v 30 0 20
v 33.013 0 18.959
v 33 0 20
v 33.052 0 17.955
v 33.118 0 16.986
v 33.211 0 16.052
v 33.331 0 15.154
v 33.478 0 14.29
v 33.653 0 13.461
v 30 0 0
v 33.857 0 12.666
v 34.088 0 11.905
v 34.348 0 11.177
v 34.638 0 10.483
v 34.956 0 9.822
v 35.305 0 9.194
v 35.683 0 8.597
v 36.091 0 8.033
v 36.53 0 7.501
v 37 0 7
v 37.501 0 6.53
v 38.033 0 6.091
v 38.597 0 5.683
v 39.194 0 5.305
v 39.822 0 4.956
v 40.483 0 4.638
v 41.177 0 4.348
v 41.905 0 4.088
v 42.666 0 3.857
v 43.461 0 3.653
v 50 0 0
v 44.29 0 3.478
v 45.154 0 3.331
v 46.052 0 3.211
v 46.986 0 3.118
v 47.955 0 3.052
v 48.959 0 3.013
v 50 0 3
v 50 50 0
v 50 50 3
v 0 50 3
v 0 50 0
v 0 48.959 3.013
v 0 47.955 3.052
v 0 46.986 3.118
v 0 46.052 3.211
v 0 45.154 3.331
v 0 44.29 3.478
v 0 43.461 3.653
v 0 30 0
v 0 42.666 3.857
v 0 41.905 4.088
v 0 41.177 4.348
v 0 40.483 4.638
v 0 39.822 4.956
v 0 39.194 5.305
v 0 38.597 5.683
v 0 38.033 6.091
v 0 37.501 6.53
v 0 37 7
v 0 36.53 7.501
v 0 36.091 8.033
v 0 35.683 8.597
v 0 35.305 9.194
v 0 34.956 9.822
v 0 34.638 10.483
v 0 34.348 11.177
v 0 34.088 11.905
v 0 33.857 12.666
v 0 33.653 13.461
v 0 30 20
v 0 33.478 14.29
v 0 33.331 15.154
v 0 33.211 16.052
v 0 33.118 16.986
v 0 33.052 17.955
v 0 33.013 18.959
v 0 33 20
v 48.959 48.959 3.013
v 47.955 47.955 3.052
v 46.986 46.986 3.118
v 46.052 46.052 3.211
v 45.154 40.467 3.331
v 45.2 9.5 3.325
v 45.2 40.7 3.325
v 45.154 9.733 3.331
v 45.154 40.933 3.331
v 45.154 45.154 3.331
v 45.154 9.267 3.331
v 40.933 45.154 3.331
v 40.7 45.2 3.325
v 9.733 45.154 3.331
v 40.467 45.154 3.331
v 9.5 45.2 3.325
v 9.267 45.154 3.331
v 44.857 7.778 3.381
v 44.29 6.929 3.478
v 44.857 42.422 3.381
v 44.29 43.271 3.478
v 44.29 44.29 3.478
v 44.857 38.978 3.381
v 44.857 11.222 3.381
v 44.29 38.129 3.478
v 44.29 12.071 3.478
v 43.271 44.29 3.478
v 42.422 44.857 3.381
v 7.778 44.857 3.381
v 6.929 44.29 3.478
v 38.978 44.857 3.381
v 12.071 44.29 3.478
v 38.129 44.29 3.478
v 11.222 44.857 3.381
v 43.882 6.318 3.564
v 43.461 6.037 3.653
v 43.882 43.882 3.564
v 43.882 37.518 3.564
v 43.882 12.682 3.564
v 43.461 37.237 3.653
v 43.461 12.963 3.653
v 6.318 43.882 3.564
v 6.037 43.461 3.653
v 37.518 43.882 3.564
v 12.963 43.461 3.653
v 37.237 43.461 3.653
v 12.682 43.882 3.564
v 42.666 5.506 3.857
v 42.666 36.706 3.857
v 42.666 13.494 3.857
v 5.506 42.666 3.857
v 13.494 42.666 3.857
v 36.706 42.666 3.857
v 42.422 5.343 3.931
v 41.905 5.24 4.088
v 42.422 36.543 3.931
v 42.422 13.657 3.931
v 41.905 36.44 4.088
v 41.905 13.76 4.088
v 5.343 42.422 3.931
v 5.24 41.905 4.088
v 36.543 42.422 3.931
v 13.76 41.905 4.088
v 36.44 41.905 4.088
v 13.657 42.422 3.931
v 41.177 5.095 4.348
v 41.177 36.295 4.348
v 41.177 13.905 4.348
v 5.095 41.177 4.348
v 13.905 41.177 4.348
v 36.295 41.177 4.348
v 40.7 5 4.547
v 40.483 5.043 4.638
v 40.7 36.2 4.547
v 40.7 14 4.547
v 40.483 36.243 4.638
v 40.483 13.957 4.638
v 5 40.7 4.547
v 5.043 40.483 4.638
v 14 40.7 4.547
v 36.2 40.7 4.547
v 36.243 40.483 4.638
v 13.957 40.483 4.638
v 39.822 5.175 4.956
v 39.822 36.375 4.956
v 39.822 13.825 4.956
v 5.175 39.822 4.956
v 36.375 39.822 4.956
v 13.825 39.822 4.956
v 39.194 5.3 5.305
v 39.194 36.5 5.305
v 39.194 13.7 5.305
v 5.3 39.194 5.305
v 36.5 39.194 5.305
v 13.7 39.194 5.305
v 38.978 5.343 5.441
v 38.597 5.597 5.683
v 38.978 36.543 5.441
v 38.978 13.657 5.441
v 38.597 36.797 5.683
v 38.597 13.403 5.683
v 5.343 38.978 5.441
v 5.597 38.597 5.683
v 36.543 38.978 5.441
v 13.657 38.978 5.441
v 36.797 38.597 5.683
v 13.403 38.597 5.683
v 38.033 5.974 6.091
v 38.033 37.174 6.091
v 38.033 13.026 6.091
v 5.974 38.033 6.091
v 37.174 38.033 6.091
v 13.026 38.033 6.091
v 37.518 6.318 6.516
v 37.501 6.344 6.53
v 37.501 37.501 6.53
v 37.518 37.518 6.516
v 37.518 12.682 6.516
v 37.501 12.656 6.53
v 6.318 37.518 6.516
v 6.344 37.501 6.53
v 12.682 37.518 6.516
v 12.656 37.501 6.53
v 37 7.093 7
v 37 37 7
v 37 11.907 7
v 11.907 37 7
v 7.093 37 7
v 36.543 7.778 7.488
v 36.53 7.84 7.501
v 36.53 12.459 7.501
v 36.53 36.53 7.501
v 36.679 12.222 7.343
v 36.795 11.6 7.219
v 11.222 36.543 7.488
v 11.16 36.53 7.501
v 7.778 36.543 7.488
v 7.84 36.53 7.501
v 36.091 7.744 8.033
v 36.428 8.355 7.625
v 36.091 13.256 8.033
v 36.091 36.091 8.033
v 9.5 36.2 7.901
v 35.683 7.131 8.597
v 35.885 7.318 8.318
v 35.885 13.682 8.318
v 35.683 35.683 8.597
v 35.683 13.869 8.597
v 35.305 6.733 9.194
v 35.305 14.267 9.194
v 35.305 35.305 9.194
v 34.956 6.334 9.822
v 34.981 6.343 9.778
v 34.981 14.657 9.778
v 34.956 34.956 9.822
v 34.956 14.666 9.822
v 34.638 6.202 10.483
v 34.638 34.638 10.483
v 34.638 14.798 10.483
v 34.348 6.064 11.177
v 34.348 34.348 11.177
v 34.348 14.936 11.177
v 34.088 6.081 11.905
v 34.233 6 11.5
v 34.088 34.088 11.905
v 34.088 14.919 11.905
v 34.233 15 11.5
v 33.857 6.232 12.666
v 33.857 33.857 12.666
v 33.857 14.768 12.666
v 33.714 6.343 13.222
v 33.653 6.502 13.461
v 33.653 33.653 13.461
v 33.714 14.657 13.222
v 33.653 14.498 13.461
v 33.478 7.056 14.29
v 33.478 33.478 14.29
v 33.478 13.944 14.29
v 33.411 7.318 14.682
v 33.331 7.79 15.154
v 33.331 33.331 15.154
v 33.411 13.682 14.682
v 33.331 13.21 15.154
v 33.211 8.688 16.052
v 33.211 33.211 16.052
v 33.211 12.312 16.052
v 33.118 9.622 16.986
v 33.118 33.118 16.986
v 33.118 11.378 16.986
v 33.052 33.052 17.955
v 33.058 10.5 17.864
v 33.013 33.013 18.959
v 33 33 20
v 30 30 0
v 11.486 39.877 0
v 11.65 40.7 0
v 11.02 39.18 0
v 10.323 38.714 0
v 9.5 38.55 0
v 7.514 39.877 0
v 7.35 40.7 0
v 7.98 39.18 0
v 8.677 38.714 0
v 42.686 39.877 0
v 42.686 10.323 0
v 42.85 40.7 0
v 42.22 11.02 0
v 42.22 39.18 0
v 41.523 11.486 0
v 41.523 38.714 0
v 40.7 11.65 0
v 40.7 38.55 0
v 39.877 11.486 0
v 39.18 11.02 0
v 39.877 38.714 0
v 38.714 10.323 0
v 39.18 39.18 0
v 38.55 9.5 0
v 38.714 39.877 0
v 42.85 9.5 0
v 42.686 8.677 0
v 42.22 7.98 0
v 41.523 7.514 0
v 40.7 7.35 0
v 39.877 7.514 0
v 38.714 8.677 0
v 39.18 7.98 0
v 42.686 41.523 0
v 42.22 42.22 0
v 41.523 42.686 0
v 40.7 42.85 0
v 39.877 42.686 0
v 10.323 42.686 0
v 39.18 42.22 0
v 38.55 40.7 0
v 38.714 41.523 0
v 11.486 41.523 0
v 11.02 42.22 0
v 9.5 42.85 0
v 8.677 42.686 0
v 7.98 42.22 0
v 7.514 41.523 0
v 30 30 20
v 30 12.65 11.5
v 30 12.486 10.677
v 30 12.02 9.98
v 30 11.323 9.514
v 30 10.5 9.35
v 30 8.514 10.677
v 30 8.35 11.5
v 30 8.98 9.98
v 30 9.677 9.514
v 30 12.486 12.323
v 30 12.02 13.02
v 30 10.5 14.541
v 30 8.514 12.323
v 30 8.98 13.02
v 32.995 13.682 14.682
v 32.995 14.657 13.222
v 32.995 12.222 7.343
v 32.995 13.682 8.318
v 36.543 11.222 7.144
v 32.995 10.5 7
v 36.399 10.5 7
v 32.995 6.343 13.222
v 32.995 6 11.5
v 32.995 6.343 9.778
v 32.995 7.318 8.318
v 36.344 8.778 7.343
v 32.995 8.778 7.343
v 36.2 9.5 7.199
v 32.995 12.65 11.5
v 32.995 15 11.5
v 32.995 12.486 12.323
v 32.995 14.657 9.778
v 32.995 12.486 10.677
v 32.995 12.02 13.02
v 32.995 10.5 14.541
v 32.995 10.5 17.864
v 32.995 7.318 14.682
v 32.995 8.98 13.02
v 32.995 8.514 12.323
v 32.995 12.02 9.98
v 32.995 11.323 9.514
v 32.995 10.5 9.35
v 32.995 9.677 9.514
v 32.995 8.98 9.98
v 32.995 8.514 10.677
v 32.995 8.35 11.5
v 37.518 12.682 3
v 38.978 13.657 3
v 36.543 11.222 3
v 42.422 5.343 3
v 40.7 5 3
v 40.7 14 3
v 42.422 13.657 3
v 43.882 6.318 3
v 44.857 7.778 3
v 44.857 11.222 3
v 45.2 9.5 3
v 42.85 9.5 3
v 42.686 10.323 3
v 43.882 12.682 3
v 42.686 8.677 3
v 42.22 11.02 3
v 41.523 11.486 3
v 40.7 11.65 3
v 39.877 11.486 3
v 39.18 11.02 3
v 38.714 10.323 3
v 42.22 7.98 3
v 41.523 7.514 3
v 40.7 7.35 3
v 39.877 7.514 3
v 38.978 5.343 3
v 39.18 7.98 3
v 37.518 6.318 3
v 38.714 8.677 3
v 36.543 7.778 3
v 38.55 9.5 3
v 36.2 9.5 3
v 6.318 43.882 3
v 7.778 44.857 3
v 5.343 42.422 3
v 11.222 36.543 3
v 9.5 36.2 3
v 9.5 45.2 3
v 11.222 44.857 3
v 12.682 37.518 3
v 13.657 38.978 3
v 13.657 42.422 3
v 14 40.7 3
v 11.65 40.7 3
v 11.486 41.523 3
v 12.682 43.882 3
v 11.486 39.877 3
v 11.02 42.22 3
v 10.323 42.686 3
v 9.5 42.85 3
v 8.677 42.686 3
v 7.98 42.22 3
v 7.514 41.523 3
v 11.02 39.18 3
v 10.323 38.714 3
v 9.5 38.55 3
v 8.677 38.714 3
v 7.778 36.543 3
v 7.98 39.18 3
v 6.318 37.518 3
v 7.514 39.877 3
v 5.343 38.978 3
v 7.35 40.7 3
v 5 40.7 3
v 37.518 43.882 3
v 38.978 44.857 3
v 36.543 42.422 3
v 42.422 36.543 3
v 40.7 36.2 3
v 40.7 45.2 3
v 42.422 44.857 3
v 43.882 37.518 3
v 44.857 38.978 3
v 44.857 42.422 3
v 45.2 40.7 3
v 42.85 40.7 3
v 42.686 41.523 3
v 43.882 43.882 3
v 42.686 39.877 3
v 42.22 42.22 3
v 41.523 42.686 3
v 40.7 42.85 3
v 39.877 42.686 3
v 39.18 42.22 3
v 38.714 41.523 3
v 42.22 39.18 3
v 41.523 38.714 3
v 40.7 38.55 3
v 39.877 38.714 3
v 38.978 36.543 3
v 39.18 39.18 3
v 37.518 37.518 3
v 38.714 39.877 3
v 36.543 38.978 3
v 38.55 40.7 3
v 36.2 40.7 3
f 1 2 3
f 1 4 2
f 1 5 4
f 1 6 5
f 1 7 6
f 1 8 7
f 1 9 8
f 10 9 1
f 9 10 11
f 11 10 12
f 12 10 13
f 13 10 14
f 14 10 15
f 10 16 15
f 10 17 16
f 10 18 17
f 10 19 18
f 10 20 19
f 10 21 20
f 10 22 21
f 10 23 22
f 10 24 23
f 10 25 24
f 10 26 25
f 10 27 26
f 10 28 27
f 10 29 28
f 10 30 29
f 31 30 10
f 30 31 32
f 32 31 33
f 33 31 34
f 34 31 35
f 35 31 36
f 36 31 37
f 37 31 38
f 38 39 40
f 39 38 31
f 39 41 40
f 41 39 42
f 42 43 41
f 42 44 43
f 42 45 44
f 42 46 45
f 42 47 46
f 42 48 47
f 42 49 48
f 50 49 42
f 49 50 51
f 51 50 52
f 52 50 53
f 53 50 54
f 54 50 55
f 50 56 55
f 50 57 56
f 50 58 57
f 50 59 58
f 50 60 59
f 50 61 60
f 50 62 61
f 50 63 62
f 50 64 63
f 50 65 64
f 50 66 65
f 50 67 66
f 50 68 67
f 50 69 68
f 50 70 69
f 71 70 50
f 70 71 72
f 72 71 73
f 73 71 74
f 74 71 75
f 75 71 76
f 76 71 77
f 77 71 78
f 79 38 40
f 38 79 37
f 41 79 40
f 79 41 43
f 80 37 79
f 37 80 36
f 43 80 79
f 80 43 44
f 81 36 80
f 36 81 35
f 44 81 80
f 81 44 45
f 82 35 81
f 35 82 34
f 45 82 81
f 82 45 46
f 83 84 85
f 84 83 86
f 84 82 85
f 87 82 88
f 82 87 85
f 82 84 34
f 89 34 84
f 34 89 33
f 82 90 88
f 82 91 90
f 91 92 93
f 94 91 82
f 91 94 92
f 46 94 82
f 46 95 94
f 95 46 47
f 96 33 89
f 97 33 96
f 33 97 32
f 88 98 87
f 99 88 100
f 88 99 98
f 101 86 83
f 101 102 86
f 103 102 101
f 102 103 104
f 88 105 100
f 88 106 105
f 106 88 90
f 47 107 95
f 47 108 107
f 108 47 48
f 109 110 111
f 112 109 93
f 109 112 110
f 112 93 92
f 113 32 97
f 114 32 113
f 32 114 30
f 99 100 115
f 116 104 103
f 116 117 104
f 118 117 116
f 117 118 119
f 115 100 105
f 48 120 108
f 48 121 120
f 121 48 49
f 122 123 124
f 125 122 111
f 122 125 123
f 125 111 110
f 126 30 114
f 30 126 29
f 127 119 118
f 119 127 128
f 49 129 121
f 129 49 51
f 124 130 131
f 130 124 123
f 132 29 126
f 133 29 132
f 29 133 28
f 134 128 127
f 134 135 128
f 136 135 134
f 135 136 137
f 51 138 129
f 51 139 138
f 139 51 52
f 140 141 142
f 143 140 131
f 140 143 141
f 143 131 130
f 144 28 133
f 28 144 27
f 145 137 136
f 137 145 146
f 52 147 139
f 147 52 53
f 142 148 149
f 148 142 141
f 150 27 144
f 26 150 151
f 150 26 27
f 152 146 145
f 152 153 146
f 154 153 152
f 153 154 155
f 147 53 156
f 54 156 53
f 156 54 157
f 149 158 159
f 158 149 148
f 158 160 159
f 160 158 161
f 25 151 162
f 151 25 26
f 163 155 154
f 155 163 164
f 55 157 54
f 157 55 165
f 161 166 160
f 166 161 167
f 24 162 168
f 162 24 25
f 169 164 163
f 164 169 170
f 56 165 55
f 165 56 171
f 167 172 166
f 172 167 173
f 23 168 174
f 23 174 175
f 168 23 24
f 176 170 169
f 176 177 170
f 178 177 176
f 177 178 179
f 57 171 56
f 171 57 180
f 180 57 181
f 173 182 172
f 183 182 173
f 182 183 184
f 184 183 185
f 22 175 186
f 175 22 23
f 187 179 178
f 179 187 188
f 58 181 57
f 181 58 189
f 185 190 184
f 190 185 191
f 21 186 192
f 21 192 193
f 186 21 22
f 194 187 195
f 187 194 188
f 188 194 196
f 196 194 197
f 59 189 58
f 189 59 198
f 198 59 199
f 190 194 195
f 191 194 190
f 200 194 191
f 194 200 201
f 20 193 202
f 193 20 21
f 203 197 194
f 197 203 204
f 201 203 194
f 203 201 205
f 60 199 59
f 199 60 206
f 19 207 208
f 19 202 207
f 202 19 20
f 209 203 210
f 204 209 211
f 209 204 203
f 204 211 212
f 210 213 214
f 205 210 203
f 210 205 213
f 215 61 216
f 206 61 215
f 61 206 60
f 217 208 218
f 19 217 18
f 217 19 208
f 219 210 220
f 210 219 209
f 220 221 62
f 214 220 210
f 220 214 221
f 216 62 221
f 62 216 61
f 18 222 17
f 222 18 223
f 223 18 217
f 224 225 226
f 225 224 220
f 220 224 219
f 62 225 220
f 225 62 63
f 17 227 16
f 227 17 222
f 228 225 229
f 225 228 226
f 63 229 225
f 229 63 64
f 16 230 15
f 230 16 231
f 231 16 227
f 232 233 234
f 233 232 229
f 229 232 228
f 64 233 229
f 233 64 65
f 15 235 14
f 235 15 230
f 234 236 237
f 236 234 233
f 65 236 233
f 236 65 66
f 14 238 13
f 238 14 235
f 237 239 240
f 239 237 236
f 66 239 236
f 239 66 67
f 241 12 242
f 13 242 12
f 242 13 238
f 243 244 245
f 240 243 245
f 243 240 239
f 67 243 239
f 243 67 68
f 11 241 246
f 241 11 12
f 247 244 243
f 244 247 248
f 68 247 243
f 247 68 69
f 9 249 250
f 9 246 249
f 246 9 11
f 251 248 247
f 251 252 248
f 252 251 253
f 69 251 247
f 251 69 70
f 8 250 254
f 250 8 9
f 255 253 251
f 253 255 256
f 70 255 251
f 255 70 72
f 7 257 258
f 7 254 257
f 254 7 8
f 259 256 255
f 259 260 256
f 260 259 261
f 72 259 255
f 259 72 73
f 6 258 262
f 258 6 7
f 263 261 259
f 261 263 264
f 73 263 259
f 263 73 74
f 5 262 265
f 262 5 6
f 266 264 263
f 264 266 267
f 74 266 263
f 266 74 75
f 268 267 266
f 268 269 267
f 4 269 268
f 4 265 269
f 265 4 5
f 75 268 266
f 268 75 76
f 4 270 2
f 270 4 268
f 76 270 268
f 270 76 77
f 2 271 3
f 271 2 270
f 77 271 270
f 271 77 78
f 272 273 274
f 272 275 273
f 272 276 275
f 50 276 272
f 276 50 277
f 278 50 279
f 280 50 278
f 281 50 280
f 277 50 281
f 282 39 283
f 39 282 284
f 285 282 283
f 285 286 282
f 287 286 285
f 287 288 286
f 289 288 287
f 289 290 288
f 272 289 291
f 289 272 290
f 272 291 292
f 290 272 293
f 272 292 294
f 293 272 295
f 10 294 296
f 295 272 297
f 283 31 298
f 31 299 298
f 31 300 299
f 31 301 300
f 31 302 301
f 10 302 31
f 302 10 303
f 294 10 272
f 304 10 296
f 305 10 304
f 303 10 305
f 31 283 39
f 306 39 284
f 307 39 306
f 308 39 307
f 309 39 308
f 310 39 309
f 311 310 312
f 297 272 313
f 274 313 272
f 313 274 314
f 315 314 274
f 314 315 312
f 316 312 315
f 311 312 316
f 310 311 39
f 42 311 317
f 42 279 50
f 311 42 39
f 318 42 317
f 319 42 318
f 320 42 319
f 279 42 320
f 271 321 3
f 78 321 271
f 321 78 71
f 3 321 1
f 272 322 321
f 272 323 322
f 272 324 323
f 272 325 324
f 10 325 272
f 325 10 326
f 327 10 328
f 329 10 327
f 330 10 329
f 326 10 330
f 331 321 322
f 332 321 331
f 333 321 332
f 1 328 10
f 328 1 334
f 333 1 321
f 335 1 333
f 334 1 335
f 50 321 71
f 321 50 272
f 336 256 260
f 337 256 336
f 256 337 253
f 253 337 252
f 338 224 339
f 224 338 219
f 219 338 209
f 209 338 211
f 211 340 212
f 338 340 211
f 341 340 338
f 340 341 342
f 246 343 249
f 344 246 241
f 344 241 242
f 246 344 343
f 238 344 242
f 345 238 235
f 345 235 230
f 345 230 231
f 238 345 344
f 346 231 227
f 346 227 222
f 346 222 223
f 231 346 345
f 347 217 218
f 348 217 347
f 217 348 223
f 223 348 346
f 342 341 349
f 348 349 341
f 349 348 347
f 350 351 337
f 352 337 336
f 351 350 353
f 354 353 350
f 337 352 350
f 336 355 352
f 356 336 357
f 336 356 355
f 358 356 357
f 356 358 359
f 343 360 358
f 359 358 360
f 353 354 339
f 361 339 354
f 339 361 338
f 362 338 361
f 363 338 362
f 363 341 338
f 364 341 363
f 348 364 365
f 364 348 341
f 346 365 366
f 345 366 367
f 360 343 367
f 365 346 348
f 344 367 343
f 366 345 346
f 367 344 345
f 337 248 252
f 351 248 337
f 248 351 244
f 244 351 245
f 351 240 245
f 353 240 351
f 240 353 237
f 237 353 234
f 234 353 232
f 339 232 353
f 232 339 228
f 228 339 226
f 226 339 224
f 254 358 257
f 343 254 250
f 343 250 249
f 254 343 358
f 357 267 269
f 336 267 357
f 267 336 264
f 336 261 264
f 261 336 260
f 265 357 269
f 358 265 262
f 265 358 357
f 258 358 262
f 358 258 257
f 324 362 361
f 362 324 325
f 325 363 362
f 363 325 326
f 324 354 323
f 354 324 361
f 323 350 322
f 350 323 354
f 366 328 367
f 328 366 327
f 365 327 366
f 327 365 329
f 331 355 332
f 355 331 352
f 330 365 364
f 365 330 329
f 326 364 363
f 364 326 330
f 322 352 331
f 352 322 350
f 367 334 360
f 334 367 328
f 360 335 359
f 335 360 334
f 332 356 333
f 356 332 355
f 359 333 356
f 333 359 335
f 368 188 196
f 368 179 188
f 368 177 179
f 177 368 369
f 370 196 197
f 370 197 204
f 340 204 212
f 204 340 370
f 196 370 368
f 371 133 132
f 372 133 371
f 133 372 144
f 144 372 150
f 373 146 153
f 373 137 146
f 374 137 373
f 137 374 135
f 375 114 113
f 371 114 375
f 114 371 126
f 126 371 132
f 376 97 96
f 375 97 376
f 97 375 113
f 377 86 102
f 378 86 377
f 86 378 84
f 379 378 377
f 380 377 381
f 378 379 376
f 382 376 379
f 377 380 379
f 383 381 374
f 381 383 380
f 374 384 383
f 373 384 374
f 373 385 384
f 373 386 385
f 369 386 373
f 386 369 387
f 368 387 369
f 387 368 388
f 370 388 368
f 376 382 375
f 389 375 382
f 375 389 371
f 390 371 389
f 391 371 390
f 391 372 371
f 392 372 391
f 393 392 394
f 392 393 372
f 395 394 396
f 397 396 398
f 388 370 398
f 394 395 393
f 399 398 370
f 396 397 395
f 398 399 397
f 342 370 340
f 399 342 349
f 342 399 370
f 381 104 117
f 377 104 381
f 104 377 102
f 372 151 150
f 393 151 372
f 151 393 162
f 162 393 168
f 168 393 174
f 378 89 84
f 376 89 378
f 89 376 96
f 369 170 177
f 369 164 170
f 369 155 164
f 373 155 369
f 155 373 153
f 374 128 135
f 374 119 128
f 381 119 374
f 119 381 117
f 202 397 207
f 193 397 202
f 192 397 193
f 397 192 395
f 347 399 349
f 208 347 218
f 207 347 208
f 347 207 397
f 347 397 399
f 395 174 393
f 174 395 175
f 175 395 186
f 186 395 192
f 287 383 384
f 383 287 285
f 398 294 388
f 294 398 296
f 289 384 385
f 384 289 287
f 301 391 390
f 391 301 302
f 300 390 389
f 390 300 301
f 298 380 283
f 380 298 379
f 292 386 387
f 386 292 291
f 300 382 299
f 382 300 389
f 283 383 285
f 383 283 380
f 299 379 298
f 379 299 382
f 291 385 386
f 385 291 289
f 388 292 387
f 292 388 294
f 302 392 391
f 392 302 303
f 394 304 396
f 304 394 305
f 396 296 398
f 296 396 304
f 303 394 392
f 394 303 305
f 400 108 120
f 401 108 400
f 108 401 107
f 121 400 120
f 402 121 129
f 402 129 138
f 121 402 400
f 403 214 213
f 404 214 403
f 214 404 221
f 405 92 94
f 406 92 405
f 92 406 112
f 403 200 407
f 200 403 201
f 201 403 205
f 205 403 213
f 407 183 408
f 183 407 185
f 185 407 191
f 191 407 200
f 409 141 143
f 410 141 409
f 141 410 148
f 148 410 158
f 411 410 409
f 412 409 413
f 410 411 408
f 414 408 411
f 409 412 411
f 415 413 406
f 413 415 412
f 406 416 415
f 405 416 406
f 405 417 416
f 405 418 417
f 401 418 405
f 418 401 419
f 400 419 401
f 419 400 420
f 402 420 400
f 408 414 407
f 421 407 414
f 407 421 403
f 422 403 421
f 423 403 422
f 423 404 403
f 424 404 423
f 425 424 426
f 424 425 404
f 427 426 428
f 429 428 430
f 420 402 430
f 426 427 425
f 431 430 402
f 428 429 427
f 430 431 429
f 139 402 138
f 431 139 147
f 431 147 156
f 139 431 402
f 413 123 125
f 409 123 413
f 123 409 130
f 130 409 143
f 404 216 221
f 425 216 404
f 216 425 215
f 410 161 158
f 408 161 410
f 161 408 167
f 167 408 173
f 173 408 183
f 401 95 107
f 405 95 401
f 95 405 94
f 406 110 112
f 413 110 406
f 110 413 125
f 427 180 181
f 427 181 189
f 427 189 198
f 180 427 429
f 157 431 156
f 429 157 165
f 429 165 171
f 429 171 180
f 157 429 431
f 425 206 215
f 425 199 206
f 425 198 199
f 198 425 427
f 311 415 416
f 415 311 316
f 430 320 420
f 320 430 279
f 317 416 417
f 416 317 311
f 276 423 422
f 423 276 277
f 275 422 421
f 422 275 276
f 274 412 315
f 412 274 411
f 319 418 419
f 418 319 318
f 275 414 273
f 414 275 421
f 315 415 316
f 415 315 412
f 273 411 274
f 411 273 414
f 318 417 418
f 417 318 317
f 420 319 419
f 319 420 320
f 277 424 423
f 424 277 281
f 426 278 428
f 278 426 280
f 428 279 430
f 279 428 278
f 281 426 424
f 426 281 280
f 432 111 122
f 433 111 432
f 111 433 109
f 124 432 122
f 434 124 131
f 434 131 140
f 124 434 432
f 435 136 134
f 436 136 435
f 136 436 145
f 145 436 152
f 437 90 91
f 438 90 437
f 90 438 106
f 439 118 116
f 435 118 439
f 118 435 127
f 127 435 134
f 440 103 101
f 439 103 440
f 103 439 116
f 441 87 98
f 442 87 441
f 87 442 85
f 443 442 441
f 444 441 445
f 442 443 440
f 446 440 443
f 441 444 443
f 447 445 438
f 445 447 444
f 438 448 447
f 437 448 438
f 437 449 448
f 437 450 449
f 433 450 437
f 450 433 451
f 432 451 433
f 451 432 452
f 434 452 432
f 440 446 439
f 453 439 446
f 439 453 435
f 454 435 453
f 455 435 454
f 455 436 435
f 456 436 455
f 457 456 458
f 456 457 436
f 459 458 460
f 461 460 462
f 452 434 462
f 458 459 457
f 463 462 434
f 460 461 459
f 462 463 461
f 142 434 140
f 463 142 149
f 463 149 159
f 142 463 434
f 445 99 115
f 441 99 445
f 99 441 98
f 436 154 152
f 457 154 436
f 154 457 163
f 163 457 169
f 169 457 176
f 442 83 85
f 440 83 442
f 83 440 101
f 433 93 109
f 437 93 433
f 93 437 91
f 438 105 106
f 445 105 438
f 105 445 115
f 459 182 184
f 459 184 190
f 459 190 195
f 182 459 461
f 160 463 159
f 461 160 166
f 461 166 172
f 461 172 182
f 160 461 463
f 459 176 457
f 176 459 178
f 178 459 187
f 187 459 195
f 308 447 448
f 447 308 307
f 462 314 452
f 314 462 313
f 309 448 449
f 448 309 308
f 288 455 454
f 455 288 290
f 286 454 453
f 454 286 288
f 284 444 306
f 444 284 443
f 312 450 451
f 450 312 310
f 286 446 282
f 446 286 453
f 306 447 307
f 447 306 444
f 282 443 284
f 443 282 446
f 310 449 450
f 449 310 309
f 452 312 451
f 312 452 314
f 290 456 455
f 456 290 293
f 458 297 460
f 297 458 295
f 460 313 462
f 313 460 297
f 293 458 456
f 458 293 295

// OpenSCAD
// file: triangulation.scad
function _furthestAwayFromPoint(points,poly,z,bestD=-1,bestPos=0,pos=0) = 
    len(poly) <= pos ? bestPos :
    norm(points[poly[pos]]-z) > bestD ? _furthestAwayFromPoint(points,poly,z,bestD=norm(points[poly[pos]]-z),bestPos=pos,pos=pos+1) :
    _furthestAwayFromPoint(points,poly,z,bestD=bestD,bestPos=bestPos,pos=pos+1);
    
function _triangleArea(a,b,c) = let(cr=cross(b-a,c-a)/2)
        is_num(cr) ? abs(cr) : norm(cr);
    
function _furthestAwayFromLine(points,poly,z1,z2,bestArea=-1,bestPos=0,pos=0) = 
    len(poly) <= pos ? bestPos :
    _triangleArea(z1,z2,points[poly[pos]]) > bestArea ? _furthestAwayFromLine(points,poly,z1,z2,bestArea=_triangleArea(z1,z2,points[poly[pos]]),bestPos=pos,pos=pos+1) :
    _furthestAwayFromLine(points,poly,z1,z2,bestArea=bestArea,bestPos=bestPos,pos=pos+1);
    
function normalize(v) = v/norm(v);

function _winding(points,poly,sum=0,pos=0) =
    pos >= len(poly) ? sum :
    _winding(points,poly,sum=sum+(points[poly[(pos+1)%len(poly)]][0]-points[poly[pos]][0])*(points[poly[(pos+1)%len(poly)]][1]+points[poly[pos]][1]),pos=pos+1);

function _isCCW(points,poly) =
_winding(points,poly) < 0;

function identifyPlane(points,poly) = 
let(i=_furthestAwayFromPoint(points,poly,points[poly[0]]),
           j=_furthestAwayFromLine(points,poly,points[poly[0]],points[poly[i]]),
           normal = cross(points[poly[i]]-points[poly[0]],points[poly[j]]-points[poly[0]]),
           a = points[poly[i]]-points[poly[0]],
           b = cross(normal,a),
           cs = [points[poly[0]],normalize(a),normalize(b),normalize(normal)])
           cs;
                      
function projectPoint(coordsys,p) = let(v=p-coordsys[0],
           vp=v-(v*coordsys[3])*coordsys[3]) [vp*coordsys[1],vp*coordsys[2]];
           
function projectPoints(coordsys,p) = [for(v=p) projectPoint(coordsys,v)];
    
function _removeDuplicates(points,poly)
    = [for (i=[0:len(poly)-1]) if (points[poly[(i+1)%len(poly)]] != points[poly[i]]) poly[i]];
    
function triangulate(points,poly=undef,holes=[]) = 
    let(poly = poly==undef ? [for(i=[0:1:len(points)-1]) i] : poly)
    let(poly = _removeDuplicates(points,poly),
        holes = [for(h=holes) _removeDuplicates(points,h)])
    len(points[poly[0]]) == 2 ?triangulate2D(points,poly,holes) : triangulate2D(projectPoints(identifyPlane(points,poly),points),poly,holes);
    
function _leftMostHoleData(points,holes,indexOfHole=0,indexInHole=0,bestData=undef,) =
    indexOfHole >= len(holes) ? bestData[1] :
    indexInHole >= len(holes[indexOfHole]) ? _leftMostHoleData(points,holes,indexOfHole=indexOfHole+1,indexInHole=0,bestData=bestData) :
    bestData==undef || points[holes[indexOfHole][indexInHole]][0] < bestData[0] ? _leftMostHoleData(points,holes,indexOfHole=indexOfHole,indexInHole=indexInHole+1,bestData=[points[holes[indexOfHole][indexInHole]][0], [indexOfHole, indexInHole]]) :
    _leftMostHoleData(points,holes,indexOfHole=indexOfHole,indexInHole=indexInHole+1,bestData=bestData);
    
function _rightMostPrimaryData(points,primary,limitX,pos=0,bestData=undef) =   
    pos >= len(primary) ?  bestData[1] :    
    points[primary[pos]][0] < limitX && (bestData==undef || points[primary[pos]] > bestData[0]) ?  _rightMostPrimaryData(points,primary,limitX,pos=pos+1,bestData=[points[primary[pos]][0],pos]) :
    _rightMostPrimaryData(points,primary,limitX,pos=pos+1,bestData=bestData);

function _makeLoop(start,loop,index) = concat([start],[for(i=[0:len(loop)]) loop[(i+index)%len(loop)]],[start]);

function _addLoop(primary,holes,indexWithinPrimary,indexOfHole,indexWithinHole) = 
    let(hole=holes[indexOfHole],
        newHoles=[for(i=[0:len(holes)-1]) if(i!=indexOfHole) holes[i]],
        newPrimary=[for(i=[0:len(primary)-1]) for(p= i!=indexWithinPrimary ? [primary[i]] : _makeLoop(primary[i],hole,indexWithinHole)) p])
       [newPrimary,newHoles];
        
function _removeHoles1(points,primary,holes) =
    len(holes) == 0 ? primary :
    let(holeData=_leftMostHoleData(points,holes),
        indexOfHole=holeData[0],
        indexWithinHole=holeData[1],
        holePointIndex=holes[indexOfHole][indexWithinHole],
        hp=points[holePointIndex],
        indexWithinPrimary=_rightMostPrimaryData(points,primary,hp[0]),
        primaryAndHoles=_addLoop(primary,holes,indexWithinPrimary,indexOfHole,indexWithinHole)) _removeHoles1(points,primaryAndHoles[0],primaryAndHoles[1]);   
        
function _removeHolesAndReorient(points,primary,holes) =    let(points=_isCCW(points,primary)?points:[for(p=points) [p[0],-p[1]]])
        [points,_removeHoles1(points,primary,[for(h=holes) _orient(newPoints,h,ccw=false)])];

function mod(a,b) = let(m=a%b) m < 0 ? m+b : m;

function _delPoint(v,i) = [for(j=[0:1:len(v)-1]) if(i!=j) v[j]];
    
function _isCCWTriangle(a,b,c) = cross(b-a,c-a) >= 0;
    
function _crosses(points,poly,a,b,ignore,pos=0) =     
    pos >= len(poly) ? false :
    ignore != pos && ignore !=  mod(pos+1,len(poly)) && _isCross(points[poly[pos]],points[poly[mod(pos+1,len(poly))]],a,b) ? true : _crosses(points,poly,a,b,pos=pos+1);

function _isReflex(points,poly,i) = 
    let(n=len(poly),
        a=points[poly[mod(i-1,n)]],
        b=points[poly[i]],
        c=points[poly[mod(i+1,n)]]) cross(b-a,c-b) < 0;
                
function _checkEar2(points,poly,a,b,c,j) = 
   let(p=points[poly[mod(j,len(poly))]],
       c1=cross(p-a,b-a))
       ! ( c1*cross(p-b,c-b) >0 && c1*cross(p-c,a-c)>0 );
                
function _checkEar(points,poly,a,b,c,i,j) =
    mod(j,len(poly))==mod(i-1,len(poly)) ? true :
    _isReflex(points,poly,mod(j,len(poly))) && ! _checkEar2(points,poly,a,b,c,j) ? false :
    _checkEar(points,poly,a,b,c,i,j+1);

function _isEar(points,poly,i) = 
    _isReflex(points,poly,i) ? false :
    let(n=len(poly),
        a=points[poly[mod(i-1,n)]],
        b=points[poly[i]],
        c=points[poly[mod(i+1,n)]],
        j=i+2)
        _checkEar(points,poly,a,b,c,i,i+2);        

function _findEar(points,poly,pos=0) =
    assert(pos<len(poly))
    _isEar(points,poly,pos) ? pos : _findEar(points,poly,pos=pos+1);

function _cutEar(points,poly) = 
    let(n=len(poly),
        i=_findEar(points,poly))
        _delPoint(poly,i);
            
function _getEar(points,poly) = 
    let(n=len(poly),
        i=_findEar(points,poly))
        [poly[mod(i-1,n)],poly[i],poly[mod(i+1,n)]];
        
function _reverse(v) = [for(i=[len(v)-1:-1:0]) v[i]];
    
function _orient(points,poly,ccw=true) = !!_isCCW(points,poly) == ccw ? poly : _reverse(poly);

function triangulate2D(points,poly,holes=[],soFar=[]) =
    let(pp = _removeHolesAndReorient(points,poly,holes),
    points=pp[0],
    poly=pp[1])
    len(poly) == 3 ? concat(soFar,[poly]) :
    triangulate2D(points,_cutEar(points,poly),soFar=concat(soFar,[_getEar(points,poly)]));
    
module showMesh(points,tt,width=1) 
{
    for(t=tt) {
        for(i=[0:1:len(t)-1]) {
            hull() {
                translate(points[t[i]]) sphere(d=width);
                translate(points[t[(i+1)%len(t)]]) sphere(d=width);
            }
        }
    }
}

function _find(needle,haystack) = let(f=search([needle], haystack)) f==[[]] ? undef : f[0];

function _refineTriangle(triangle,maxEdge) =
    let(a = triangle[0],
        b = triangle[1],
        c = triangle[2],
        ab = norm(a-b),
        bc = norm(b-c),
        ca = norm(c-a))
        ab <= maxEdge && bc <= maxEdge && ca <= maxEdge ? [triangle] :
        ab > maxEdge && bc > maxEdge && ca > maxEdge ? [[a,(a+b)/2,(a+c)/2],[b,(b+c)/2,(a+b)/2],[c,(a+c)/2,(b+c)/2],[(a+c)/2,(a+b)/2,(b+c)/2]] :
    ab > maxEdge && bc > maxEdge ? [[b,(b+c)/2,(a+b)/2],[a,(a+b)/2,(b+c)/2],[c,a,(b+c)/2]] :
    bc > maxEdge && ca > maxEdge ? [[c,(c+a)/2,(b+c)/2],[b,(b+c)/2,(c+a)/2],[a,b,(c+a)/2]] :
    ca > maxEdge && ab > maxEdge ? [[a,(a+b)/2,(c+a)/2],[c,(c+a)/2,(a+b)/2],[b,c,(a+b)/2]] :
    ab > maxEdge ? [[a,(a+b)/2,c],[(a+b)/2,b,c]] :
    bc > maxEdge ? [[b,(b+c)/2,a],[(b+c)/2,c,a]] :
    /*ca > maxEdge */ [[c,(c+a)/2,b],[(c+a)/2,a,b]];

function _refineMesh1(triangles,maxEdge,pos=0,newTriangles=[]) =
    pos >= len(triangles) ? newTriangles :
    _refineMesh1(triangles,maxEdge,pos=pos+1,newTriangles=concat(newTriangles,_refineTriangle(triangles[pos],maxEdge)));
    
/* simpler but slower */
function _refineMesh1(triangles,maxEdge) =
    [for(t=triangles) for(tr=_refineTriangle(t,maxEdge)) tr];


function _maxEdge(faces) = max([for(f=faces) for(i=[0:len(f)-1]) norm(f[(i+1)%len(f)]-f[i])]);

function _refineMeshN(triangles,maxEdge,n=0) =
    n <= 0 ? triangles : _refineMeshN(_refineMesh1(triangles,maxEdge),maxEdge,n=n-1);
    
function _newPointsAndFaces(pointsAndFaces,face,faceSoFar=[]) =
    let(pos=len(faceSoFar),
        points=pointsAndFaces[0],
        faces=pointsAndFaces[1]
    )
    pos >= len(face) ? [points,concat(faces,[faceSoFar])] :
    let(v=face[pos],
        i=_find(v,points)) i==undef ? _newPointsAndFaces([concat(points,[v]),faces],face,faceSoFar=concat(faceSoFar,[len(points)])) : _newPointsAndFaces(pointsAndFaces,face,faceSoFar=concat(faceSoFar,[i]));            
        
function _toPointsAndFaces(faces,pointsAndFaces=[[],[]], pos=0) =
    pos >= len(faces) ? pointsAndFaces :
    _toPointsAndFaces(faces,_newPointsAndFaces(pointsAndFaces,faces[pos]),pos=pos+1);
    
function refineMesh(mesh=undef,points=[],triangles=[],maxEdge=5) =
    let(
        points=mesh==undef?points:mesh[0],
        triangles=mesh==undef?triangles:mesh[1],
        tris = [for (t=triangles) [for (v=t) points[v]]],
        longestEdge = _maxEdge(tris),
        n = ceil(ln(longestEdge/maxEdge)/ln(2)),
        newTris = _refineMeshN(tris, maxEdge, n)) _toPointsAndFaces(newTris);
    
function _cutZ(a,b,z,normal) =
    let(an = a*normal)
        an == z ? a :
        let(bn = b*normal)
        bn == z ? b :
        let(t=(z-a*normal)/(b*normal-a*normal))
        (1-t)*a+t*b;
    
function _cutTriangle0(t, z, normal) = 
    /* cut lines joining vertex 0 to others */
    t[1]*normal == z ?
    let(cut02 = _cutZ(t[0],t[2],z,normal))
    [[cut02,t[0],t[1]],[cut02,t[1],t[2]]] :
    t[2][2] == z ?
    let(cut01 = _cutZ(t[0],t[1],z,normal))
    [[cut01,t[2],t[0]],[cut01,t[1],t[2]]] :
    let(cut01 = _cutZ(t[0],t[1],z,normal),
        cut02 = _cutZ(t[0],t[2],z,normal))
    [[cut02,t[0],cut01],
     [t[1],t[2],cut02],
     [cut02,cut01,t[1]]];

function _cutTriangle(t,z,normal) = 
    (t[0]*normal <= z && t[1]*normal <= z && t[2]*normal <= z) || (t[0]*normal >= z && t[1]*normal >= z && t[2]*normal >= z ) ? [t] :
    (t[0]*normal >= z && t[1]*normal >= z) || (t[0]*normal <= z && t[1]*normal <= z) ? _cutTriangle0([t[2],t[0],t[1]], z,normal) :
    (t[1]*normal >= z && t[2]*normal >= z) || (t[1]*normal <= z && t[2]*normal <= z) ? _cutTriangle0(t, z, normal) :
    _cutTriangle0([t[1],t[2],t[0]],z, normal);

function cutMesh(mesh=undef,points=[],triangles=[],slice=0,normal=[1,0,0]) =
        sliceMesh(mesh=mesh,points=points,triangles=triangles,slices=[slice],normal=normal);
            
function _normalize(v) = 
    let(vv = 
        v[0] == 0 && v[1] == 0 ? [0,0,sign(v[2])] :
        v[0] == 0 && v[2] == 0 ? [0,sign(v[1]),0] :
        v[1] == 0 && v[2] == 0 ? [sign(v[0]),0,0] :
        v / norm(v))
        [for(i=[0:1:len(v)-1]) vv[i]];
            
function _sliceTriangles(triangles,slices,normal,pos=0) =
    pos >= len(slices) ? triangles :
    _sliceTriangles([for(t=triangles) for(s=_cutTriangle(t,slices[pos],normal)) s],slices,normal,pos=pos+1);
        
function _makeSlices(points,triangles,slices,normal,spacing) =
    slices != undef ? slices :
    let(zs = [for(t=triangles) for(v=t) points[v]*normal],
        zMin = min(zs),
        zMax = max(zs),
        n = ceil((zMax-zMin) / spacing)-1)
        echo(n)n <= 0 ? [] :
        [for(i=[1:1:n]) zMin+i*spacing];    

function sliceMesh(mesh=undef,points=[],triangles=[],slices=undef,spacing=undef,normal=[1,0,0]) =
        let(points=mesh==undef?points:mesh[0],triangles=mesh==undef?triangles:mesh[1],
        normal=_normalize(normal),
        slices=_makeSlices(points,triangles,slices,normal,spacing))
        _toPointsAndFaces(_sliceTriangles([for(t=triangles) [for (v=t) points[v]]],slices,normal));
            
function _origin(dimensions) = [for(i=[0:1:dimensions-1]) 0];        
            
function _cmCalc(points,triangles,pos=0,weightedSum=undef,sumWeights=0) =
        pos >= len(triangles) ?  weightedSum/sumWeights :
        _cmCalc(points,triangles,pos=pos+1,weightedSum=(weightedSum==undef?_origin(len(points[0])):weightedSum)+_triangleArea(points[triangles[pos][0]],points[triangles[pos][1]],points[triangles[pos][2]])*(points[triangles[pos][0]]+points[triangles[pos][1]]+points[triangles[pos][2]])/3,sumWeights=sumWeights+_triangleArea(points[triangles[pos][0]],points[triangles[pos][1]],points[triangles[pos][2]]));
    
function centerOfMass(mesh=undef,points=[],triangles=[]) =
        let(points=mesh==undef?points:mesh[0],triangles=mesh==undef?triangles:mesh[1])
        _cmCalc(points,triangles);
        
//<skip>
/*
function testPoly2(n) = concat([for(i=[0:n-1]) 20*[cos(i*360/n),rands(-.3,.3,1)[0],sin(i*360/n)]],[for(i=[0:n-1]) 20*[0.8*cos(i*360/n),rands(-.3,.3,1)[0],-0.8*sin(i*360/n)]]);

testPoints=testPoly2(11);
tt = triangulate(testPoints);
m = refineMesh(points=testPoints,triangles=tt,maxEdge=5);
showMesh(m[0],m[1],width=.2);
*/
//</skip>
// main file
use <bezier.scad>;
use <tubemesh.scad>;

postSize = 30;
supportHeight = 20;
supportWidth = 20;
thicknessAtBottom = 3;
thicknessAtTop = 3;
topVerticalityControl = 0.6;
bottomHorizontalityControl = 0.6;
countersinkDiameter = 9;
screwHoleDiameter = 4.3;
screwHoleLength = 3;
teardropHoles = true;
minimumHoleDistanceFromEdge = 5;
xFaceHolePositions =  [ [1,0.5] ];
yFaceHolePositions = [];
//    [ [1,1], [1,0], [0,1] ];
zFaceHolePositions = 
    [ [0,0.1], /* [0.5,0.7], */ [1,0.1] ];

module dummy() {}

precision = 0.03;
nudge = 0.005;

curve = Bezier([ 
    [supportWidth,0],
    SHARP(),
    SHARP(),
    [supportWidth,thicknessAtBottom],
    OFFSET([-bottomHorizontalityControl * supportWidth,0]),
    OFFSET([0,-topVerticalityControl*supportHeight]),
    [thicknessAtTop,supportHeight] ], precision=precision); 

function maxInRange(c,i,start,end) =
    start > end ? -1e20 :
    max([for(j=[start:end]) c[j][i]]);
        
function makeMonotone(c) =
    let(last=len(c)-1)
    [for(i=[0:last]) [maxInRange(c,0,i,last),min(maxInRange(c,1,0,i),supportHeight)]];

function makeUnique(c) =
    [for(i=[0:len(c)-1]) if(i==0 || c[i]!=c[i-1]) c[i]];
        
function makeStrictlyMonotone(c) =
    let(minimumSpacing = min([for(i=[1:len(c)-1]) if(c[i][1] > c[i][0]) c[i][1]-c[i][0]]),
        delta = minimumSpacing / len(c) / 100)
    [for(i=[0:len(c)-1]) i==0 || c[i][1]!=c[i-1][1] ? c[i] : [c[i][0], c[i][1]+i*delta]];

curve2 = makeStrictlyMonotone(makeUnique(makeMonotone(curve)));     
 
sections = [for(p=curve2) let(d=p[0]+postSize)
     [ [0,0,p[1]], [d,0,p[1]], [d,d,p[1]], [0,d,p[1] ] ]
     ];

module support() {
    render(convexity=2)
    difference() {
        tubeMesh(sections,optimize=false);
        translate([0,0,-nudge]) cube([postSize,postSize,supportHeight+2*nudge+10]);
    }
}

module horizontalHole(diameter=10,length=50,teardrop=true) {
    rotate([0,90,0]) {
        cylinder(d=diameter, h=length);
        if (teardrop)
        translate([-diameter/(2*sqrt(2)),0,0]) cylinder(d=diameter/sqrt(2), h=length, $fn=4);
    }
}

module horizontalScrewHole(teardrop=teardropHoles) {
    $fn = 16;
    translate([screwHoleLength,0,0])
    horizontalHole(diameter=countersinkDiameter, length=supportWidth+2*nudge, teardrop=teardrop);
    translate([-nudge,0,0])
    horizontalHole(diameter=screwHoleDiameter, length = screwHoleLength + 2*nudge, teardrop=teardrop);
}
module verticalScrewHole() {
    rotate([0,-90,0])
    horizontalScrewHole(teardrop=false);
}

holeOffset =  minimumHoleDistanceFromEdge + countersinkDiameter / 2;

module xFaceScrewHoles() {
    y0 = holeOffset;
    z0 = thicknessAtBottom + holeOffset;
    y1 = supportWidth - holeOffset;
    z1 = supportHeight - holeOffset;
    for(pos=xFaceHolePositions) {
        y = (1-pos[0])*y0 + (pos[0])*y1;
        z = (1-pos[1])*z0 + (pos[1])*z1;
        translate([postSize-nudge,y,z]) horizontalScrewHole();
    }
}

module yFaceScrewHoles() {
    x0 = postSize + thicknessAtTop - holeOffset;
    z0 = thicknessAtBottom + holeOffset;
    x1 = holeOffset;
    z1 = supportHeight - holeOffset;
    for(pos=yFaceHolePositions) {
        x = (1-pos[0])*x0 + (pos[0])*x1;
        z = (1-pos[1])*z0 + (pos[1])*z1;
        translate([x,postSize-nudge,z])
        rotate([0,0,90]) horizontalScrewHole();
    }
}

module zFaceScrewHoles() {
    x0 = postSize + supportWidth - holeOffset;
    x1 = postSize + thicknessAtTop + holeOffset;
    y0 = holeOffset;
    
    for(pos=zFaceHolePositions) {
        x = (1-pos[1])*x0 + pos[1]*x1;
        y1 = x;
        y = (1-pos[0])*y0 + (pos[0])*y1;
        translate([x,y,0]) verticalScrewHole();
        translate([y,x,0]) verticalScrewHole();
    }
}

render(convexity=5)
difference() {
    support();
    xFaceScrewHoles();
    yFaceScrewHoles();
    zFaceScrewHoles();
}
